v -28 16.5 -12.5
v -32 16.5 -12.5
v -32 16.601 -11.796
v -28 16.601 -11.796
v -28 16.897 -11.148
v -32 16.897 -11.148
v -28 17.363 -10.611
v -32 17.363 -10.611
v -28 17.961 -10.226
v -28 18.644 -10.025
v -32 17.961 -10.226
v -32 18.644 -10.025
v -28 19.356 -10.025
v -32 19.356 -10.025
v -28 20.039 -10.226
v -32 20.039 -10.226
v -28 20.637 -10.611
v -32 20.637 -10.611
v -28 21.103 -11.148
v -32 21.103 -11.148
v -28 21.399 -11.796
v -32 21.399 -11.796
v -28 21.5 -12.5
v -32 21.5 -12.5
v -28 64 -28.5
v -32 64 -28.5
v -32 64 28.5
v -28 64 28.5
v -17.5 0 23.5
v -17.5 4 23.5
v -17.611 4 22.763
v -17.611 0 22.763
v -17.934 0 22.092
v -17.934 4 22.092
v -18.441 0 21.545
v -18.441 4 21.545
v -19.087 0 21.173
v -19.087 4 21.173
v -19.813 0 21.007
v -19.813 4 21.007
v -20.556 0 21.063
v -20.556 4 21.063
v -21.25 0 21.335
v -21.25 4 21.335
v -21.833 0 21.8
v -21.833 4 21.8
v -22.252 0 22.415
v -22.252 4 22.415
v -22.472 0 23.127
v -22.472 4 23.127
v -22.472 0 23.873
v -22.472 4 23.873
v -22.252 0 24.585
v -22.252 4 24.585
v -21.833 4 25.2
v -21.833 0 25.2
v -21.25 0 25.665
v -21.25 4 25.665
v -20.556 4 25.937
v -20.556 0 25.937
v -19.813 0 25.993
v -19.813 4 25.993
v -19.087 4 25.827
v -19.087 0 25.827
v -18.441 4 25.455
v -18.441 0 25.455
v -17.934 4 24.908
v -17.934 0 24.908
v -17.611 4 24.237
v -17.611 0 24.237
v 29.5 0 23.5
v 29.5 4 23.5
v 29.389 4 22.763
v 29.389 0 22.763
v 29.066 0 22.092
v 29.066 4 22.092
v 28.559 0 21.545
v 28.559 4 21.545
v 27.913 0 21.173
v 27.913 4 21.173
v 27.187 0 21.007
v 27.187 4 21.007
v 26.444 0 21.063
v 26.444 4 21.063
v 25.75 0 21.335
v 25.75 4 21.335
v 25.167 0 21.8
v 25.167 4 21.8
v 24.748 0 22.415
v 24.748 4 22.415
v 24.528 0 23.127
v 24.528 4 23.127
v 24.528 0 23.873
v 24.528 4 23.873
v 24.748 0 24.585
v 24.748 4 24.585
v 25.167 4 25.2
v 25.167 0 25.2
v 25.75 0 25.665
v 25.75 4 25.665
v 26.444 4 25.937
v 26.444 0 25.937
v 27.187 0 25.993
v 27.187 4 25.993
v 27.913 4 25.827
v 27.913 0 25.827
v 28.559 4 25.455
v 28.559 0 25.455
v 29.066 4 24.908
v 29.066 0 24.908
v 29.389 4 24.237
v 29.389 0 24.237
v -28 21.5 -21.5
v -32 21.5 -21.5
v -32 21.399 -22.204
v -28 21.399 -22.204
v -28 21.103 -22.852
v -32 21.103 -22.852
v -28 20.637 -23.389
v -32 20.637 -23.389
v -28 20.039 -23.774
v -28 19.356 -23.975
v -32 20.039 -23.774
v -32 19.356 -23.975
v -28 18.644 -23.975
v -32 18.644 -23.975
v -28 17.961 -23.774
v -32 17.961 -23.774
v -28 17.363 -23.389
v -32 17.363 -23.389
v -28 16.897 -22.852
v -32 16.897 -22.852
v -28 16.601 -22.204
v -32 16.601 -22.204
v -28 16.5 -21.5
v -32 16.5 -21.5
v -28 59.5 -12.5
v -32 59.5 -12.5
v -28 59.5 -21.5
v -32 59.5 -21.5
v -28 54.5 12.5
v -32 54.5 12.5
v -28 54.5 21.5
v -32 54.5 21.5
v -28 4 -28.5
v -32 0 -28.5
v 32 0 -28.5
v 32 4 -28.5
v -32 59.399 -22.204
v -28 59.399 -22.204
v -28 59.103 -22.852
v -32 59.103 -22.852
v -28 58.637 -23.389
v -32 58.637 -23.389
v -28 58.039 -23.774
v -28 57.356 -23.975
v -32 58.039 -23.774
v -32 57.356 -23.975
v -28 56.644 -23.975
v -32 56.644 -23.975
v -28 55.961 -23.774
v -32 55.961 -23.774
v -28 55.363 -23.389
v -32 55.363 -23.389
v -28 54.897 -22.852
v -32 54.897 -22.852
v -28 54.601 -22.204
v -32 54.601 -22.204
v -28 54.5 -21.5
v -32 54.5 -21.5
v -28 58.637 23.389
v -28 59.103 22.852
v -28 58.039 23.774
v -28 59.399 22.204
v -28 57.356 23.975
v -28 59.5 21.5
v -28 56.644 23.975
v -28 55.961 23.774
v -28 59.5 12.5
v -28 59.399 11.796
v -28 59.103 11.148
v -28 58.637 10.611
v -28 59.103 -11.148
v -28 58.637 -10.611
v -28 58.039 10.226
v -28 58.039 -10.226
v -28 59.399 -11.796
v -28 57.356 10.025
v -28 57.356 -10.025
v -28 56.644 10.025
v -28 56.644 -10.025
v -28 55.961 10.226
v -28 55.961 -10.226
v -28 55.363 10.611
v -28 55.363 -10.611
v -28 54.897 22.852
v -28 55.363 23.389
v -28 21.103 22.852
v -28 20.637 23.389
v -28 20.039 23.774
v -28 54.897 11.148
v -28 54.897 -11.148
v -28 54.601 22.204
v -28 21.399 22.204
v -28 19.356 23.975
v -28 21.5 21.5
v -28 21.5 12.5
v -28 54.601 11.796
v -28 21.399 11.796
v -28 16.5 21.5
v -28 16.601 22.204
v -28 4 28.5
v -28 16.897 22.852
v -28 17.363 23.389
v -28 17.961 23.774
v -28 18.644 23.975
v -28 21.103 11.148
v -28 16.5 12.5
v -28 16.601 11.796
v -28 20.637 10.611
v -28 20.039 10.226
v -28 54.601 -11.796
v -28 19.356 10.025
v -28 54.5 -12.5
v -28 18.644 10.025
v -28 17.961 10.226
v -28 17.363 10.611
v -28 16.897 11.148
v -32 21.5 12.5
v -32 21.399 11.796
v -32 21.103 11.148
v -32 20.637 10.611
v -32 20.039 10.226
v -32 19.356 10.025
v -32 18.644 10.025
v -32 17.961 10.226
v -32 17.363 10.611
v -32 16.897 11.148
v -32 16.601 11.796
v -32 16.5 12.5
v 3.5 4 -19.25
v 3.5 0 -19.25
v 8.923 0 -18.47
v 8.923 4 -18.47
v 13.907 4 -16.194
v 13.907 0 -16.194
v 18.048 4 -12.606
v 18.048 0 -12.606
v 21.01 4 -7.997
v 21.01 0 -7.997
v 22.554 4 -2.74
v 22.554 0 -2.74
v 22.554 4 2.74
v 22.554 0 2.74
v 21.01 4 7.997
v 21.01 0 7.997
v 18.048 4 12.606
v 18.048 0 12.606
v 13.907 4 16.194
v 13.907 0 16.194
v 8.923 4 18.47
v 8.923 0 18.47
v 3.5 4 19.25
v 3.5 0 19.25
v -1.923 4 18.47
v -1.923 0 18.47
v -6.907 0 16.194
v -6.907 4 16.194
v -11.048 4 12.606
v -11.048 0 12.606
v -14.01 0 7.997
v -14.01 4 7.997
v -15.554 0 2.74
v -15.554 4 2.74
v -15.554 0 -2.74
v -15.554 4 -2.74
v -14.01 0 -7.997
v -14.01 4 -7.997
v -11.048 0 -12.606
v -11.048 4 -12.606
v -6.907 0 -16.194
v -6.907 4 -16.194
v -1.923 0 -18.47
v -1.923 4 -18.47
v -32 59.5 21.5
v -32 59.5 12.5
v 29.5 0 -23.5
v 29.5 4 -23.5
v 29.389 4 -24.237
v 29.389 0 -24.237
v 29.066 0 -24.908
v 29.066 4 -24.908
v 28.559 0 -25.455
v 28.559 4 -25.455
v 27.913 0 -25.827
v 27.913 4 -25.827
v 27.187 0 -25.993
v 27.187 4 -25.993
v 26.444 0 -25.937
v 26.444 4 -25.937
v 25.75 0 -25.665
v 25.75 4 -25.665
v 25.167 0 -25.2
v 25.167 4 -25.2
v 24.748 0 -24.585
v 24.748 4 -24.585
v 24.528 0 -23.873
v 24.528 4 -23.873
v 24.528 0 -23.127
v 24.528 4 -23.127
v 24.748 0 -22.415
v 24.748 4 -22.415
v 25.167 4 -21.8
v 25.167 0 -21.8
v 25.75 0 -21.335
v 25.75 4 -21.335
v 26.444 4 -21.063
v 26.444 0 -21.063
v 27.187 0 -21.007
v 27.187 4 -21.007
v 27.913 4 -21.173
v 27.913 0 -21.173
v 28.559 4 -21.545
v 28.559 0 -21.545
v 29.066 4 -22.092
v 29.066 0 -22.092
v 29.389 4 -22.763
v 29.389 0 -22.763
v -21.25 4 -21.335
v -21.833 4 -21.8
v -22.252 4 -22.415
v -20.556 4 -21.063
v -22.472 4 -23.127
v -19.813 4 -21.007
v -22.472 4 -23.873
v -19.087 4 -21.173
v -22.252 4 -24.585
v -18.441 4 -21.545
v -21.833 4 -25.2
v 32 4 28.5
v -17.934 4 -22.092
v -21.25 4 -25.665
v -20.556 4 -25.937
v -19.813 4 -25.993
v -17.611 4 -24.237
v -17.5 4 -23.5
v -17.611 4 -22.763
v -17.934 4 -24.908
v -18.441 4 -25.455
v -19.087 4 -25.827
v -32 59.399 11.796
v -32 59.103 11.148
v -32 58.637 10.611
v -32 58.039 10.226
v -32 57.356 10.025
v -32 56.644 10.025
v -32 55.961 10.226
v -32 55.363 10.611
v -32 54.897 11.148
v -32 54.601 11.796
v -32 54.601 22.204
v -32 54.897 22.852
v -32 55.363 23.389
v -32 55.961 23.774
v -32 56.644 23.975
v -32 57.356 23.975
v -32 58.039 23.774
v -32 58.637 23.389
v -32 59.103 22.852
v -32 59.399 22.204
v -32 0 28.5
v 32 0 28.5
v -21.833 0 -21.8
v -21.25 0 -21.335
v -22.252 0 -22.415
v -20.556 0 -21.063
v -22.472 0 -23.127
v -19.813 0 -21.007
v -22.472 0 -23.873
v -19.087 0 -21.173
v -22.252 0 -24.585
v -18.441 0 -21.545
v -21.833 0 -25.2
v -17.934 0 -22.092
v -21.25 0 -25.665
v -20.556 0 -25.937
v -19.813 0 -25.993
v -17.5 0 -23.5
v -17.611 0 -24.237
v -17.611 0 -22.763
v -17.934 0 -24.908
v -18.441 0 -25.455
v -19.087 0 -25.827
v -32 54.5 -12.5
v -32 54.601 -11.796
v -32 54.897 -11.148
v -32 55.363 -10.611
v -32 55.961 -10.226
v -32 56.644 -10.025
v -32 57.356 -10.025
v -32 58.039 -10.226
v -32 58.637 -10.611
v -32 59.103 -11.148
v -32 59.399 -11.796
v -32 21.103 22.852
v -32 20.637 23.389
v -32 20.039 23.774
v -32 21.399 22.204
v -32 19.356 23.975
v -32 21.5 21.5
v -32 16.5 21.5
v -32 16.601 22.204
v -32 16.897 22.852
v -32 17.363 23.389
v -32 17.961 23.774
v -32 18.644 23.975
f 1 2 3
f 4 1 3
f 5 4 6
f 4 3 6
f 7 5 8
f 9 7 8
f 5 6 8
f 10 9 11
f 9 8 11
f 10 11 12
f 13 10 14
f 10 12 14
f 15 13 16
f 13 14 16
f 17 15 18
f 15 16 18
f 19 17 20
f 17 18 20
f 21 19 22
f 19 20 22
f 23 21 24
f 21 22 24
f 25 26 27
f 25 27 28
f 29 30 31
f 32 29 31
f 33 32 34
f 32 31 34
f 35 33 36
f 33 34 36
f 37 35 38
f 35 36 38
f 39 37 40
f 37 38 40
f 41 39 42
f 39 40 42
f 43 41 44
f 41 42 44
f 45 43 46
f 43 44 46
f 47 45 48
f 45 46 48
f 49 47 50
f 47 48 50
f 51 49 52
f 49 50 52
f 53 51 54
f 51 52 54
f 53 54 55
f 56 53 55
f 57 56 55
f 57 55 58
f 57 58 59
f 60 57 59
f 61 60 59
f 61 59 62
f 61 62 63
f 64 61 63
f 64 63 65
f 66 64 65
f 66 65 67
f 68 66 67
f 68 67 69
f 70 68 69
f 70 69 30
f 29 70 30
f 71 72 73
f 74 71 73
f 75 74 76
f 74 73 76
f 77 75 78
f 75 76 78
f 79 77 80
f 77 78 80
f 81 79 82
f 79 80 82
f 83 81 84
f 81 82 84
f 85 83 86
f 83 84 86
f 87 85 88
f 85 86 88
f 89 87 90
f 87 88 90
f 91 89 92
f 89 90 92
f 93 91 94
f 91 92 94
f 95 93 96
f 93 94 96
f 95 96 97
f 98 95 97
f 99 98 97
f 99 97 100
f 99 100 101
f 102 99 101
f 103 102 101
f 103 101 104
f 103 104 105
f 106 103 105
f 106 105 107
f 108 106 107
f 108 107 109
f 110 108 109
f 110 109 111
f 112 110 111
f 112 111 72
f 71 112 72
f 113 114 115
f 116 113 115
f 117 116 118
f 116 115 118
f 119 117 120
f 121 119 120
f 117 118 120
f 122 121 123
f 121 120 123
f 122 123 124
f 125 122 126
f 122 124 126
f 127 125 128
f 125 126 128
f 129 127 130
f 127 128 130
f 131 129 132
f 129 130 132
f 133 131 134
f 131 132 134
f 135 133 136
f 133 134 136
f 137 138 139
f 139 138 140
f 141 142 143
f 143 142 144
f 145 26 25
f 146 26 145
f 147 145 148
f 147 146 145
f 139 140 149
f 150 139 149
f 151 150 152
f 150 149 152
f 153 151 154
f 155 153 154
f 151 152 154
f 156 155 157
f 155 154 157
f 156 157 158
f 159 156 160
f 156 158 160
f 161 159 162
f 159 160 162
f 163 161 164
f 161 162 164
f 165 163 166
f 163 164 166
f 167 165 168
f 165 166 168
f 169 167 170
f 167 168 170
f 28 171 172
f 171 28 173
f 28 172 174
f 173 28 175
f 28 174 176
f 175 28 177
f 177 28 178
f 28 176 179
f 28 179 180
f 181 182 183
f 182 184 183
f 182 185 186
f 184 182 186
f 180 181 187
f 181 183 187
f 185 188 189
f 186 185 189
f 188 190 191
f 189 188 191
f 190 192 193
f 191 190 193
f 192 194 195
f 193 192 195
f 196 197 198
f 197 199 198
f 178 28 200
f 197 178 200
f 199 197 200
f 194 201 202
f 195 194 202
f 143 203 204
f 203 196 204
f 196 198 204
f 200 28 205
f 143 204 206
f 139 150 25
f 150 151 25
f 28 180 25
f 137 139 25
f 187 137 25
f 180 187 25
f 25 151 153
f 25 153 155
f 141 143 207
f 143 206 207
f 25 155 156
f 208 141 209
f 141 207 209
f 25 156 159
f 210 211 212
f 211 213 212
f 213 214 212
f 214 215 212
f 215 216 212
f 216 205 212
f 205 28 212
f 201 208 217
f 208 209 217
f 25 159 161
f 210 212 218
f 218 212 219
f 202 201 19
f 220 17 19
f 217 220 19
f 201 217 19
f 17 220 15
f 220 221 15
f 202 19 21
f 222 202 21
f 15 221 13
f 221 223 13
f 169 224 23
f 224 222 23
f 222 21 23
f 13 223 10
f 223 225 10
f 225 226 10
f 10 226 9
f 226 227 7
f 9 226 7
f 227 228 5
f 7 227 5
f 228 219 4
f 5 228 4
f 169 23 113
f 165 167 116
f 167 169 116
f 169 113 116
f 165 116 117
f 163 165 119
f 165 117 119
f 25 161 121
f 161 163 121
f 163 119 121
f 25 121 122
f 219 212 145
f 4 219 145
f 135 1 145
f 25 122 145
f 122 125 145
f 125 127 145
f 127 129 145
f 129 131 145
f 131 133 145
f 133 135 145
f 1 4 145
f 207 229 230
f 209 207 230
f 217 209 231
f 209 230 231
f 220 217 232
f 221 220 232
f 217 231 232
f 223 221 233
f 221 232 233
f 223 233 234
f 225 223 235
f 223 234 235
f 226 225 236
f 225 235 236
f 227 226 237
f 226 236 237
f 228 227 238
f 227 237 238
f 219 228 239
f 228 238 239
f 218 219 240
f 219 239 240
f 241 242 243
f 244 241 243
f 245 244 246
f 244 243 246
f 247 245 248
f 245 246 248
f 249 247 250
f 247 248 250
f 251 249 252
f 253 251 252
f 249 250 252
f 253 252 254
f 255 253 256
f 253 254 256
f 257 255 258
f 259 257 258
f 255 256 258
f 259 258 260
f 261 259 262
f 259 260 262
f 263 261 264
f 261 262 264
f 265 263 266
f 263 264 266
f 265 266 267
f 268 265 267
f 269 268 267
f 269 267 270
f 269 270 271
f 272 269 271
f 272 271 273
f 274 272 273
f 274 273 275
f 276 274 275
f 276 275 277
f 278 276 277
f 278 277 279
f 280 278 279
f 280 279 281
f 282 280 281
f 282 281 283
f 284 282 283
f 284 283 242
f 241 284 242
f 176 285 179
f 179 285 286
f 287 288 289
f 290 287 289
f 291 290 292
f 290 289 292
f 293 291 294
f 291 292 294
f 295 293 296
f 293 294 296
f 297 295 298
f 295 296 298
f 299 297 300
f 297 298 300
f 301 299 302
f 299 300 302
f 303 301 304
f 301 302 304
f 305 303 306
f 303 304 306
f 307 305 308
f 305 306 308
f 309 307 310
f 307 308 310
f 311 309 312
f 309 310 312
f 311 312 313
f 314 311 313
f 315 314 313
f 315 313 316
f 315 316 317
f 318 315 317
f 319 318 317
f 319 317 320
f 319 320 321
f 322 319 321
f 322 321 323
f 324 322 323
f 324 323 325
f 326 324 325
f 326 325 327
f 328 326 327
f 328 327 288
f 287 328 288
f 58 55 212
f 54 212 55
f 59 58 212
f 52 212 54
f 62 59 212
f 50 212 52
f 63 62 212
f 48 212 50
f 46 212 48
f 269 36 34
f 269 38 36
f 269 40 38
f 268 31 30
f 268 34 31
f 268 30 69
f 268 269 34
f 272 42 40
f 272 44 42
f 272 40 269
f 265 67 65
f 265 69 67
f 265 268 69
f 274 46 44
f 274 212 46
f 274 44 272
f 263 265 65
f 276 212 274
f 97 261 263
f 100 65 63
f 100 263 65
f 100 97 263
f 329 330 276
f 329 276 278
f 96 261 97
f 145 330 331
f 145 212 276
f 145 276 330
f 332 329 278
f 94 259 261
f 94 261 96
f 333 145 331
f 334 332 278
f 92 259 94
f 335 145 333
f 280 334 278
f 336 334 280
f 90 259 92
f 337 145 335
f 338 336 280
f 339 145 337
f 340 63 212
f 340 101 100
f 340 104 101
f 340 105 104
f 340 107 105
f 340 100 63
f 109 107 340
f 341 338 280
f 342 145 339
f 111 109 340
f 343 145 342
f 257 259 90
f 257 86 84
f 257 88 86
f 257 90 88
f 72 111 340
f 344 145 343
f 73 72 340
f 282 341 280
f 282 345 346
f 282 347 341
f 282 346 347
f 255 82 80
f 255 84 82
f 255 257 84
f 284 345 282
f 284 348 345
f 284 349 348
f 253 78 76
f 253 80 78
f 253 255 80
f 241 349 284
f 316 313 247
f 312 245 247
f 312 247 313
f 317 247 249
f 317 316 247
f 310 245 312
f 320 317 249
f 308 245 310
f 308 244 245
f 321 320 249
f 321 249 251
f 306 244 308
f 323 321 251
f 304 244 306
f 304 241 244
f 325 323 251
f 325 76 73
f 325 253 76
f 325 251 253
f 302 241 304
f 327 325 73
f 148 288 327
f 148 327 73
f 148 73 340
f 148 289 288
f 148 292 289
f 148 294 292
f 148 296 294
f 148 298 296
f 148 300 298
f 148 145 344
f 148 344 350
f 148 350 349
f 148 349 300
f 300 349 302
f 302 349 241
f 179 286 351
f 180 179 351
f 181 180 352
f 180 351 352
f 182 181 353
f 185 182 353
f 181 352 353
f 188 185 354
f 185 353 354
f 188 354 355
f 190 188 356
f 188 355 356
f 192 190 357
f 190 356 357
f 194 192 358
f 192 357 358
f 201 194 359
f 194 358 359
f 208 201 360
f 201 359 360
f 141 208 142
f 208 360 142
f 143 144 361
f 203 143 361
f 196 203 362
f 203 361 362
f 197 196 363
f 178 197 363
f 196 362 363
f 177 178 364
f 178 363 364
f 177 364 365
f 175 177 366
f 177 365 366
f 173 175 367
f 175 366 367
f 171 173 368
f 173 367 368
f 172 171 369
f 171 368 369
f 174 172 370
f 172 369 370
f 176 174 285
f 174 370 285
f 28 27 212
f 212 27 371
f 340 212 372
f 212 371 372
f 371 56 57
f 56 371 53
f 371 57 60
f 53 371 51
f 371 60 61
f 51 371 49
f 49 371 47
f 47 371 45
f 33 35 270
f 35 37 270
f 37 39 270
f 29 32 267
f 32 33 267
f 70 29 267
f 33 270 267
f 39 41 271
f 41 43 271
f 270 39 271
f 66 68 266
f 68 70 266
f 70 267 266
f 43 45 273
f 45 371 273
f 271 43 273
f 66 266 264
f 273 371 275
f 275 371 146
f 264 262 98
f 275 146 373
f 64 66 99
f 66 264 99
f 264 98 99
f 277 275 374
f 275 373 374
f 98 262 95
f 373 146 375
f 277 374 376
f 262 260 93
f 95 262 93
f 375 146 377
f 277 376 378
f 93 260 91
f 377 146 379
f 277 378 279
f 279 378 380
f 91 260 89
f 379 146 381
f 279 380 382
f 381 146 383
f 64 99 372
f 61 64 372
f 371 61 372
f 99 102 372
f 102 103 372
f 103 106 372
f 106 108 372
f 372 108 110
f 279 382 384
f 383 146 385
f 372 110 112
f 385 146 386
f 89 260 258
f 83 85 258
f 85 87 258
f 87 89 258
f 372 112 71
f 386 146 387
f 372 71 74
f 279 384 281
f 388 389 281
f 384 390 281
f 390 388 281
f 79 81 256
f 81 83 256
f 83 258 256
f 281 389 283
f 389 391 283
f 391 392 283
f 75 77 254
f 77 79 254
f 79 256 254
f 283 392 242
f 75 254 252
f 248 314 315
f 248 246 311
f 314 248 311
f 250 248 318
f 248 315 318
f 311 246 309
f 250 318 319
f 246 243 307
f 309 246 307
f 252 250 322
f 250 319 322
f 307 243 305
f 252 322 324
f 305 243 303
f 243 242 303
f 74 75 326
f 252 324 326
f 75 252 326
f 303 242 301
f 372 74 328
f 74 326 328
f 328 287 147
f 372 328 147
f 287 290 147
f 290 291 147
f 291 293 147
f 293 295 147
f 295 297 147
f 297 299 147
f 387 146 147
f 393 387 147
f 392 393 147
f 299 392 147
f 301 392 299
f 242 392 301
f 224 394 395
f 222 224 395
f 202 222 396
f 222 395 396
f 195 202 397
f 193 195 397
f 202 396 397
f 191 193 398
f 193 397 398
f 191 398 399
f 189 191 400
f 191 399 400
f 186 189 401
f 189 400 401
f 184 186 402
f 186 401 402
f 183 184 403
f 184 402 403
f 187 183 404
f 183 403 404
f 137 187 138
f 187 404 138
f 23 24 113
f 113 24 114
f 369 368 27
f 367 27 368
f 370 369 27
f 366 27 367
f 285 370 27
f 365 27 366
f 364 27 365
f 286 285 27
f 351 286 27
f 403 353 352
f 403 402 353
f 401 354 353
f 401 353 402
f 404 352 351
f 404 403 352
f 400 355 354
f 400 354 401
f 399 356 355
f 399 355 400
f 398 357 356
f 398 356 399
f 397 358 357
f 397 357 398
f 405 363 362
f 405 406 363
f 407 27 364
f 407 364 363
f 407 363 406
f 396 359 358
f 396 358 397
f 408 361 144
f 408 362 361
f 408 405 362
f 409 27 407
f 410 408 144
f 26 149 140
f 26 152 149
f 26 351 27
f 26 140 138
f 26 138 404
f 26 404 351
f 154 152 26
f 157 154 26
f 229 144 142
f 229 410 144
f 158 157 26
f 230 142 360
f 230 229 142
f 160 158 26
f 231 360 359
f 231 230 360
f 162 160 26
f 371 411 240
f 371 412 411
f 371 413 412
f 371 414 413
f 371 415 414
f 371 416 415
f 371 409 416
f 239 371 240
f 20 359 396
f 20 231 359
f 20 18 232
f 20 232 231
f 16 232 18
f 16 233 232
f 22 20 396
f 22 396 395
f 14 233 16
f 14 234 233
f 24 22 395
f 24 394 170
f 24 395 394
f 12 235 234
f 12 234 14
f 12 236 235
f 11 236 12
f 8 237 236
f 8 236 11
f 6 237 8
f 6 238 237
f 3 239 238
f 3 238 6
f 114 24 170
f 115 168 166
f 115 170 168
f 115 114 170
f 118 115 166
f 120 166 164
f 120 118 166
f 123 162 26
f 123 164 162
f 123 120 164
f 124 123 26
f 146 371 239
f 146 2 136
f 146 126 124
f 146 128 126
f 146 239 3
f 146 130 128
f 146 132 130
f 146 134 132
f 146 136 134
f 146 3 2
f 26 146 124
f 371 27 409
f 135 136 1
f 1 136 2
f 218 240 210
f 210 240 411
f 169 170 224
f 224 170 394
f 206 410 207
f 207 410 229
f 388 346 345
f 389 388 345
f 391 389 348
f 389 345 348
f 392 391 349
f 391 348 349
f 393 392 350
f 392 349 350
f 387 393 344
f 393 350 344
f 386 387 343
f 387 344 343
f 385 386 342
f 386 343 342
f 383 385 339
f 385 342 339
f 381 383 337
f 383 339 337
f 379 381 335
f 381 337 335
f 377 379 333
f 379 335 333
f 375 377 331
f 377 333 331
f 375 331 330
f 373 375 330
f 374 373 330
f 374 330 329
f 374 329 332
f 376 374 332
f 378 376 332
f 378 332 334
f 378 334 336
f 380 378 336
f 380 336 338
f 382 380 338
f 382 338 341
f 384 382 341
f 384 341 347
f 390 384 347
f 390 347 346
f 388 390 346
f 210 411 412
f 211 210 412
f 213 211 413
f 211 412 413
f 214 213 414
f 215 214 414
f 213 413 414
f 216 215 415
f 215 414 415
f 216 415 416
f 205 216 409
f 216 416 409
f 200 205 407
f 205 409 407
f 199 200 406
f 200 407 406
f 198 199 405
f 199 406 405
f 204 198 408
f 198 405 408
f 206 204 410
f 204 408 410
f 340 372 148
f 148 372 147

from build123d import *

# Parameters (mm, degrees)
SKETCH1_W                = 64
SKETCH1_H                = 57
BOSS_EXTRUDE1_DEPTH      = 4
SKETCH2_W                = 4
SKETCH2_H                = 57
BOSS_EXTRUDE2_DEPTH      = 60
SKETCH3_R                = 19.25
CUT_EXTRUDE1_DEPTH       = 60
F_5_0_5_DIAMETER_HOLE1_D = 5
CUT_EXTRUDE2_DEPTH       = 60


with BuildPart() as part:
    # Sketch1 → Boss-Extrude1 (new body)
    with BuildSketch(Plane(origin=(0, 0, 0), x_dir=(1, 0, 0), z_dir=(0, 1, 0))):
        Rectangle(SKETCH1_W, SKETCH1_H)
    extrude(amount=BOSS_EXTRUDE1_DEPTH)

    # Sketch2 → Boss-Extrude2 (add)
    with BuildSketch(Plane(origin=(0, 4, 0), x_dir=(1, 0, 0), z_dir=(0, 1, 0))):
        with Locations((-30, 0)):
            Rectangle(SKETCH2_W, SKETCH2_H)
    extrude(amount=BOSS_EXTRUDE2_DEPTH)

    # Sketch3 → Cut-Extrude1 (cut)
    with BuildSketch(Plane.XZ):
        with Locations(Location((3.5, 0, 0), (0, 0, 270))):
            Circle(SKETCH3_R)
    extrude(amount=-CUT_EXTRUDE1_DEPTH, mode=Mode.SUBTRACT)

    # Ø5.0 (5) Diameter Hole1 (through all)
    with Locations(Plane(origin=(0, 0, 0), x_dir=(-1, 0, 0), z_dir=(0, -1, 0))):
        with Locations((-27, -23.5), (-27, 23.5), (20, 23.5), (20, -23.5)):
            Hole(F_5_0_5_DIAMETER_HOLE1_D / 2)

    # Sketch6 → Cut-Extrude2 (cut)
    with BuildSketch(Plane.ZY.offset(32)):
        with BuildLine():
            Line((-21.5, 16.5), (-12.5, 16.5))
            ThreePointArc((-12.5, 16.5), (-10, 19), (-12.5, 21.5))
            Line((-12.5, 21.5), (-21.5, 21.5))
            ThreePointArc((-21.5, 21.5), (-24, 19), (-21.5, 16.5))
        make_face()
        with BuildLine():
            Line((12.5, 16.5), (21.5, 16.5))
            ThreePointArc((21.5, 16.5), (24, 19), (21.5, 21.5))
            Line((21.5, 21.5), (12.5, 21.5))
            ThreePointArc((12.5, 21.5), (10, 19), (12.5, 16.5))
        make_face()
        with BuildLine():
            Line((-21.5, 54.5), (-12.5, 54.5))
            ThreePointArc((-12.5, 54.5), (-10, 57), (-12.5, 59.5))
            Line((-12.5, 59.5), (-21.5, 59.5))
            ThreePointArc((-21.5, 59.5), (-24, 57), (-21.5, 54.5))
        make_face()
        with BuildLine():
            Line((12.5, 54.5), (21.5, 54.5))
            ThreePointArc((21.5, 54.5), (24, 57), (21.5, 59.5))
            Line((21.5, 59.5), (12.5, 59.5))
            ThreePointArc((12.5, 59.5), (10, 57), (12.5, 54.5))
        make_face()
    extrude(amount=-CUT_EXTRUDE2_DEPTH, mode=Mode.SUBTRACT)


solid = part.part
